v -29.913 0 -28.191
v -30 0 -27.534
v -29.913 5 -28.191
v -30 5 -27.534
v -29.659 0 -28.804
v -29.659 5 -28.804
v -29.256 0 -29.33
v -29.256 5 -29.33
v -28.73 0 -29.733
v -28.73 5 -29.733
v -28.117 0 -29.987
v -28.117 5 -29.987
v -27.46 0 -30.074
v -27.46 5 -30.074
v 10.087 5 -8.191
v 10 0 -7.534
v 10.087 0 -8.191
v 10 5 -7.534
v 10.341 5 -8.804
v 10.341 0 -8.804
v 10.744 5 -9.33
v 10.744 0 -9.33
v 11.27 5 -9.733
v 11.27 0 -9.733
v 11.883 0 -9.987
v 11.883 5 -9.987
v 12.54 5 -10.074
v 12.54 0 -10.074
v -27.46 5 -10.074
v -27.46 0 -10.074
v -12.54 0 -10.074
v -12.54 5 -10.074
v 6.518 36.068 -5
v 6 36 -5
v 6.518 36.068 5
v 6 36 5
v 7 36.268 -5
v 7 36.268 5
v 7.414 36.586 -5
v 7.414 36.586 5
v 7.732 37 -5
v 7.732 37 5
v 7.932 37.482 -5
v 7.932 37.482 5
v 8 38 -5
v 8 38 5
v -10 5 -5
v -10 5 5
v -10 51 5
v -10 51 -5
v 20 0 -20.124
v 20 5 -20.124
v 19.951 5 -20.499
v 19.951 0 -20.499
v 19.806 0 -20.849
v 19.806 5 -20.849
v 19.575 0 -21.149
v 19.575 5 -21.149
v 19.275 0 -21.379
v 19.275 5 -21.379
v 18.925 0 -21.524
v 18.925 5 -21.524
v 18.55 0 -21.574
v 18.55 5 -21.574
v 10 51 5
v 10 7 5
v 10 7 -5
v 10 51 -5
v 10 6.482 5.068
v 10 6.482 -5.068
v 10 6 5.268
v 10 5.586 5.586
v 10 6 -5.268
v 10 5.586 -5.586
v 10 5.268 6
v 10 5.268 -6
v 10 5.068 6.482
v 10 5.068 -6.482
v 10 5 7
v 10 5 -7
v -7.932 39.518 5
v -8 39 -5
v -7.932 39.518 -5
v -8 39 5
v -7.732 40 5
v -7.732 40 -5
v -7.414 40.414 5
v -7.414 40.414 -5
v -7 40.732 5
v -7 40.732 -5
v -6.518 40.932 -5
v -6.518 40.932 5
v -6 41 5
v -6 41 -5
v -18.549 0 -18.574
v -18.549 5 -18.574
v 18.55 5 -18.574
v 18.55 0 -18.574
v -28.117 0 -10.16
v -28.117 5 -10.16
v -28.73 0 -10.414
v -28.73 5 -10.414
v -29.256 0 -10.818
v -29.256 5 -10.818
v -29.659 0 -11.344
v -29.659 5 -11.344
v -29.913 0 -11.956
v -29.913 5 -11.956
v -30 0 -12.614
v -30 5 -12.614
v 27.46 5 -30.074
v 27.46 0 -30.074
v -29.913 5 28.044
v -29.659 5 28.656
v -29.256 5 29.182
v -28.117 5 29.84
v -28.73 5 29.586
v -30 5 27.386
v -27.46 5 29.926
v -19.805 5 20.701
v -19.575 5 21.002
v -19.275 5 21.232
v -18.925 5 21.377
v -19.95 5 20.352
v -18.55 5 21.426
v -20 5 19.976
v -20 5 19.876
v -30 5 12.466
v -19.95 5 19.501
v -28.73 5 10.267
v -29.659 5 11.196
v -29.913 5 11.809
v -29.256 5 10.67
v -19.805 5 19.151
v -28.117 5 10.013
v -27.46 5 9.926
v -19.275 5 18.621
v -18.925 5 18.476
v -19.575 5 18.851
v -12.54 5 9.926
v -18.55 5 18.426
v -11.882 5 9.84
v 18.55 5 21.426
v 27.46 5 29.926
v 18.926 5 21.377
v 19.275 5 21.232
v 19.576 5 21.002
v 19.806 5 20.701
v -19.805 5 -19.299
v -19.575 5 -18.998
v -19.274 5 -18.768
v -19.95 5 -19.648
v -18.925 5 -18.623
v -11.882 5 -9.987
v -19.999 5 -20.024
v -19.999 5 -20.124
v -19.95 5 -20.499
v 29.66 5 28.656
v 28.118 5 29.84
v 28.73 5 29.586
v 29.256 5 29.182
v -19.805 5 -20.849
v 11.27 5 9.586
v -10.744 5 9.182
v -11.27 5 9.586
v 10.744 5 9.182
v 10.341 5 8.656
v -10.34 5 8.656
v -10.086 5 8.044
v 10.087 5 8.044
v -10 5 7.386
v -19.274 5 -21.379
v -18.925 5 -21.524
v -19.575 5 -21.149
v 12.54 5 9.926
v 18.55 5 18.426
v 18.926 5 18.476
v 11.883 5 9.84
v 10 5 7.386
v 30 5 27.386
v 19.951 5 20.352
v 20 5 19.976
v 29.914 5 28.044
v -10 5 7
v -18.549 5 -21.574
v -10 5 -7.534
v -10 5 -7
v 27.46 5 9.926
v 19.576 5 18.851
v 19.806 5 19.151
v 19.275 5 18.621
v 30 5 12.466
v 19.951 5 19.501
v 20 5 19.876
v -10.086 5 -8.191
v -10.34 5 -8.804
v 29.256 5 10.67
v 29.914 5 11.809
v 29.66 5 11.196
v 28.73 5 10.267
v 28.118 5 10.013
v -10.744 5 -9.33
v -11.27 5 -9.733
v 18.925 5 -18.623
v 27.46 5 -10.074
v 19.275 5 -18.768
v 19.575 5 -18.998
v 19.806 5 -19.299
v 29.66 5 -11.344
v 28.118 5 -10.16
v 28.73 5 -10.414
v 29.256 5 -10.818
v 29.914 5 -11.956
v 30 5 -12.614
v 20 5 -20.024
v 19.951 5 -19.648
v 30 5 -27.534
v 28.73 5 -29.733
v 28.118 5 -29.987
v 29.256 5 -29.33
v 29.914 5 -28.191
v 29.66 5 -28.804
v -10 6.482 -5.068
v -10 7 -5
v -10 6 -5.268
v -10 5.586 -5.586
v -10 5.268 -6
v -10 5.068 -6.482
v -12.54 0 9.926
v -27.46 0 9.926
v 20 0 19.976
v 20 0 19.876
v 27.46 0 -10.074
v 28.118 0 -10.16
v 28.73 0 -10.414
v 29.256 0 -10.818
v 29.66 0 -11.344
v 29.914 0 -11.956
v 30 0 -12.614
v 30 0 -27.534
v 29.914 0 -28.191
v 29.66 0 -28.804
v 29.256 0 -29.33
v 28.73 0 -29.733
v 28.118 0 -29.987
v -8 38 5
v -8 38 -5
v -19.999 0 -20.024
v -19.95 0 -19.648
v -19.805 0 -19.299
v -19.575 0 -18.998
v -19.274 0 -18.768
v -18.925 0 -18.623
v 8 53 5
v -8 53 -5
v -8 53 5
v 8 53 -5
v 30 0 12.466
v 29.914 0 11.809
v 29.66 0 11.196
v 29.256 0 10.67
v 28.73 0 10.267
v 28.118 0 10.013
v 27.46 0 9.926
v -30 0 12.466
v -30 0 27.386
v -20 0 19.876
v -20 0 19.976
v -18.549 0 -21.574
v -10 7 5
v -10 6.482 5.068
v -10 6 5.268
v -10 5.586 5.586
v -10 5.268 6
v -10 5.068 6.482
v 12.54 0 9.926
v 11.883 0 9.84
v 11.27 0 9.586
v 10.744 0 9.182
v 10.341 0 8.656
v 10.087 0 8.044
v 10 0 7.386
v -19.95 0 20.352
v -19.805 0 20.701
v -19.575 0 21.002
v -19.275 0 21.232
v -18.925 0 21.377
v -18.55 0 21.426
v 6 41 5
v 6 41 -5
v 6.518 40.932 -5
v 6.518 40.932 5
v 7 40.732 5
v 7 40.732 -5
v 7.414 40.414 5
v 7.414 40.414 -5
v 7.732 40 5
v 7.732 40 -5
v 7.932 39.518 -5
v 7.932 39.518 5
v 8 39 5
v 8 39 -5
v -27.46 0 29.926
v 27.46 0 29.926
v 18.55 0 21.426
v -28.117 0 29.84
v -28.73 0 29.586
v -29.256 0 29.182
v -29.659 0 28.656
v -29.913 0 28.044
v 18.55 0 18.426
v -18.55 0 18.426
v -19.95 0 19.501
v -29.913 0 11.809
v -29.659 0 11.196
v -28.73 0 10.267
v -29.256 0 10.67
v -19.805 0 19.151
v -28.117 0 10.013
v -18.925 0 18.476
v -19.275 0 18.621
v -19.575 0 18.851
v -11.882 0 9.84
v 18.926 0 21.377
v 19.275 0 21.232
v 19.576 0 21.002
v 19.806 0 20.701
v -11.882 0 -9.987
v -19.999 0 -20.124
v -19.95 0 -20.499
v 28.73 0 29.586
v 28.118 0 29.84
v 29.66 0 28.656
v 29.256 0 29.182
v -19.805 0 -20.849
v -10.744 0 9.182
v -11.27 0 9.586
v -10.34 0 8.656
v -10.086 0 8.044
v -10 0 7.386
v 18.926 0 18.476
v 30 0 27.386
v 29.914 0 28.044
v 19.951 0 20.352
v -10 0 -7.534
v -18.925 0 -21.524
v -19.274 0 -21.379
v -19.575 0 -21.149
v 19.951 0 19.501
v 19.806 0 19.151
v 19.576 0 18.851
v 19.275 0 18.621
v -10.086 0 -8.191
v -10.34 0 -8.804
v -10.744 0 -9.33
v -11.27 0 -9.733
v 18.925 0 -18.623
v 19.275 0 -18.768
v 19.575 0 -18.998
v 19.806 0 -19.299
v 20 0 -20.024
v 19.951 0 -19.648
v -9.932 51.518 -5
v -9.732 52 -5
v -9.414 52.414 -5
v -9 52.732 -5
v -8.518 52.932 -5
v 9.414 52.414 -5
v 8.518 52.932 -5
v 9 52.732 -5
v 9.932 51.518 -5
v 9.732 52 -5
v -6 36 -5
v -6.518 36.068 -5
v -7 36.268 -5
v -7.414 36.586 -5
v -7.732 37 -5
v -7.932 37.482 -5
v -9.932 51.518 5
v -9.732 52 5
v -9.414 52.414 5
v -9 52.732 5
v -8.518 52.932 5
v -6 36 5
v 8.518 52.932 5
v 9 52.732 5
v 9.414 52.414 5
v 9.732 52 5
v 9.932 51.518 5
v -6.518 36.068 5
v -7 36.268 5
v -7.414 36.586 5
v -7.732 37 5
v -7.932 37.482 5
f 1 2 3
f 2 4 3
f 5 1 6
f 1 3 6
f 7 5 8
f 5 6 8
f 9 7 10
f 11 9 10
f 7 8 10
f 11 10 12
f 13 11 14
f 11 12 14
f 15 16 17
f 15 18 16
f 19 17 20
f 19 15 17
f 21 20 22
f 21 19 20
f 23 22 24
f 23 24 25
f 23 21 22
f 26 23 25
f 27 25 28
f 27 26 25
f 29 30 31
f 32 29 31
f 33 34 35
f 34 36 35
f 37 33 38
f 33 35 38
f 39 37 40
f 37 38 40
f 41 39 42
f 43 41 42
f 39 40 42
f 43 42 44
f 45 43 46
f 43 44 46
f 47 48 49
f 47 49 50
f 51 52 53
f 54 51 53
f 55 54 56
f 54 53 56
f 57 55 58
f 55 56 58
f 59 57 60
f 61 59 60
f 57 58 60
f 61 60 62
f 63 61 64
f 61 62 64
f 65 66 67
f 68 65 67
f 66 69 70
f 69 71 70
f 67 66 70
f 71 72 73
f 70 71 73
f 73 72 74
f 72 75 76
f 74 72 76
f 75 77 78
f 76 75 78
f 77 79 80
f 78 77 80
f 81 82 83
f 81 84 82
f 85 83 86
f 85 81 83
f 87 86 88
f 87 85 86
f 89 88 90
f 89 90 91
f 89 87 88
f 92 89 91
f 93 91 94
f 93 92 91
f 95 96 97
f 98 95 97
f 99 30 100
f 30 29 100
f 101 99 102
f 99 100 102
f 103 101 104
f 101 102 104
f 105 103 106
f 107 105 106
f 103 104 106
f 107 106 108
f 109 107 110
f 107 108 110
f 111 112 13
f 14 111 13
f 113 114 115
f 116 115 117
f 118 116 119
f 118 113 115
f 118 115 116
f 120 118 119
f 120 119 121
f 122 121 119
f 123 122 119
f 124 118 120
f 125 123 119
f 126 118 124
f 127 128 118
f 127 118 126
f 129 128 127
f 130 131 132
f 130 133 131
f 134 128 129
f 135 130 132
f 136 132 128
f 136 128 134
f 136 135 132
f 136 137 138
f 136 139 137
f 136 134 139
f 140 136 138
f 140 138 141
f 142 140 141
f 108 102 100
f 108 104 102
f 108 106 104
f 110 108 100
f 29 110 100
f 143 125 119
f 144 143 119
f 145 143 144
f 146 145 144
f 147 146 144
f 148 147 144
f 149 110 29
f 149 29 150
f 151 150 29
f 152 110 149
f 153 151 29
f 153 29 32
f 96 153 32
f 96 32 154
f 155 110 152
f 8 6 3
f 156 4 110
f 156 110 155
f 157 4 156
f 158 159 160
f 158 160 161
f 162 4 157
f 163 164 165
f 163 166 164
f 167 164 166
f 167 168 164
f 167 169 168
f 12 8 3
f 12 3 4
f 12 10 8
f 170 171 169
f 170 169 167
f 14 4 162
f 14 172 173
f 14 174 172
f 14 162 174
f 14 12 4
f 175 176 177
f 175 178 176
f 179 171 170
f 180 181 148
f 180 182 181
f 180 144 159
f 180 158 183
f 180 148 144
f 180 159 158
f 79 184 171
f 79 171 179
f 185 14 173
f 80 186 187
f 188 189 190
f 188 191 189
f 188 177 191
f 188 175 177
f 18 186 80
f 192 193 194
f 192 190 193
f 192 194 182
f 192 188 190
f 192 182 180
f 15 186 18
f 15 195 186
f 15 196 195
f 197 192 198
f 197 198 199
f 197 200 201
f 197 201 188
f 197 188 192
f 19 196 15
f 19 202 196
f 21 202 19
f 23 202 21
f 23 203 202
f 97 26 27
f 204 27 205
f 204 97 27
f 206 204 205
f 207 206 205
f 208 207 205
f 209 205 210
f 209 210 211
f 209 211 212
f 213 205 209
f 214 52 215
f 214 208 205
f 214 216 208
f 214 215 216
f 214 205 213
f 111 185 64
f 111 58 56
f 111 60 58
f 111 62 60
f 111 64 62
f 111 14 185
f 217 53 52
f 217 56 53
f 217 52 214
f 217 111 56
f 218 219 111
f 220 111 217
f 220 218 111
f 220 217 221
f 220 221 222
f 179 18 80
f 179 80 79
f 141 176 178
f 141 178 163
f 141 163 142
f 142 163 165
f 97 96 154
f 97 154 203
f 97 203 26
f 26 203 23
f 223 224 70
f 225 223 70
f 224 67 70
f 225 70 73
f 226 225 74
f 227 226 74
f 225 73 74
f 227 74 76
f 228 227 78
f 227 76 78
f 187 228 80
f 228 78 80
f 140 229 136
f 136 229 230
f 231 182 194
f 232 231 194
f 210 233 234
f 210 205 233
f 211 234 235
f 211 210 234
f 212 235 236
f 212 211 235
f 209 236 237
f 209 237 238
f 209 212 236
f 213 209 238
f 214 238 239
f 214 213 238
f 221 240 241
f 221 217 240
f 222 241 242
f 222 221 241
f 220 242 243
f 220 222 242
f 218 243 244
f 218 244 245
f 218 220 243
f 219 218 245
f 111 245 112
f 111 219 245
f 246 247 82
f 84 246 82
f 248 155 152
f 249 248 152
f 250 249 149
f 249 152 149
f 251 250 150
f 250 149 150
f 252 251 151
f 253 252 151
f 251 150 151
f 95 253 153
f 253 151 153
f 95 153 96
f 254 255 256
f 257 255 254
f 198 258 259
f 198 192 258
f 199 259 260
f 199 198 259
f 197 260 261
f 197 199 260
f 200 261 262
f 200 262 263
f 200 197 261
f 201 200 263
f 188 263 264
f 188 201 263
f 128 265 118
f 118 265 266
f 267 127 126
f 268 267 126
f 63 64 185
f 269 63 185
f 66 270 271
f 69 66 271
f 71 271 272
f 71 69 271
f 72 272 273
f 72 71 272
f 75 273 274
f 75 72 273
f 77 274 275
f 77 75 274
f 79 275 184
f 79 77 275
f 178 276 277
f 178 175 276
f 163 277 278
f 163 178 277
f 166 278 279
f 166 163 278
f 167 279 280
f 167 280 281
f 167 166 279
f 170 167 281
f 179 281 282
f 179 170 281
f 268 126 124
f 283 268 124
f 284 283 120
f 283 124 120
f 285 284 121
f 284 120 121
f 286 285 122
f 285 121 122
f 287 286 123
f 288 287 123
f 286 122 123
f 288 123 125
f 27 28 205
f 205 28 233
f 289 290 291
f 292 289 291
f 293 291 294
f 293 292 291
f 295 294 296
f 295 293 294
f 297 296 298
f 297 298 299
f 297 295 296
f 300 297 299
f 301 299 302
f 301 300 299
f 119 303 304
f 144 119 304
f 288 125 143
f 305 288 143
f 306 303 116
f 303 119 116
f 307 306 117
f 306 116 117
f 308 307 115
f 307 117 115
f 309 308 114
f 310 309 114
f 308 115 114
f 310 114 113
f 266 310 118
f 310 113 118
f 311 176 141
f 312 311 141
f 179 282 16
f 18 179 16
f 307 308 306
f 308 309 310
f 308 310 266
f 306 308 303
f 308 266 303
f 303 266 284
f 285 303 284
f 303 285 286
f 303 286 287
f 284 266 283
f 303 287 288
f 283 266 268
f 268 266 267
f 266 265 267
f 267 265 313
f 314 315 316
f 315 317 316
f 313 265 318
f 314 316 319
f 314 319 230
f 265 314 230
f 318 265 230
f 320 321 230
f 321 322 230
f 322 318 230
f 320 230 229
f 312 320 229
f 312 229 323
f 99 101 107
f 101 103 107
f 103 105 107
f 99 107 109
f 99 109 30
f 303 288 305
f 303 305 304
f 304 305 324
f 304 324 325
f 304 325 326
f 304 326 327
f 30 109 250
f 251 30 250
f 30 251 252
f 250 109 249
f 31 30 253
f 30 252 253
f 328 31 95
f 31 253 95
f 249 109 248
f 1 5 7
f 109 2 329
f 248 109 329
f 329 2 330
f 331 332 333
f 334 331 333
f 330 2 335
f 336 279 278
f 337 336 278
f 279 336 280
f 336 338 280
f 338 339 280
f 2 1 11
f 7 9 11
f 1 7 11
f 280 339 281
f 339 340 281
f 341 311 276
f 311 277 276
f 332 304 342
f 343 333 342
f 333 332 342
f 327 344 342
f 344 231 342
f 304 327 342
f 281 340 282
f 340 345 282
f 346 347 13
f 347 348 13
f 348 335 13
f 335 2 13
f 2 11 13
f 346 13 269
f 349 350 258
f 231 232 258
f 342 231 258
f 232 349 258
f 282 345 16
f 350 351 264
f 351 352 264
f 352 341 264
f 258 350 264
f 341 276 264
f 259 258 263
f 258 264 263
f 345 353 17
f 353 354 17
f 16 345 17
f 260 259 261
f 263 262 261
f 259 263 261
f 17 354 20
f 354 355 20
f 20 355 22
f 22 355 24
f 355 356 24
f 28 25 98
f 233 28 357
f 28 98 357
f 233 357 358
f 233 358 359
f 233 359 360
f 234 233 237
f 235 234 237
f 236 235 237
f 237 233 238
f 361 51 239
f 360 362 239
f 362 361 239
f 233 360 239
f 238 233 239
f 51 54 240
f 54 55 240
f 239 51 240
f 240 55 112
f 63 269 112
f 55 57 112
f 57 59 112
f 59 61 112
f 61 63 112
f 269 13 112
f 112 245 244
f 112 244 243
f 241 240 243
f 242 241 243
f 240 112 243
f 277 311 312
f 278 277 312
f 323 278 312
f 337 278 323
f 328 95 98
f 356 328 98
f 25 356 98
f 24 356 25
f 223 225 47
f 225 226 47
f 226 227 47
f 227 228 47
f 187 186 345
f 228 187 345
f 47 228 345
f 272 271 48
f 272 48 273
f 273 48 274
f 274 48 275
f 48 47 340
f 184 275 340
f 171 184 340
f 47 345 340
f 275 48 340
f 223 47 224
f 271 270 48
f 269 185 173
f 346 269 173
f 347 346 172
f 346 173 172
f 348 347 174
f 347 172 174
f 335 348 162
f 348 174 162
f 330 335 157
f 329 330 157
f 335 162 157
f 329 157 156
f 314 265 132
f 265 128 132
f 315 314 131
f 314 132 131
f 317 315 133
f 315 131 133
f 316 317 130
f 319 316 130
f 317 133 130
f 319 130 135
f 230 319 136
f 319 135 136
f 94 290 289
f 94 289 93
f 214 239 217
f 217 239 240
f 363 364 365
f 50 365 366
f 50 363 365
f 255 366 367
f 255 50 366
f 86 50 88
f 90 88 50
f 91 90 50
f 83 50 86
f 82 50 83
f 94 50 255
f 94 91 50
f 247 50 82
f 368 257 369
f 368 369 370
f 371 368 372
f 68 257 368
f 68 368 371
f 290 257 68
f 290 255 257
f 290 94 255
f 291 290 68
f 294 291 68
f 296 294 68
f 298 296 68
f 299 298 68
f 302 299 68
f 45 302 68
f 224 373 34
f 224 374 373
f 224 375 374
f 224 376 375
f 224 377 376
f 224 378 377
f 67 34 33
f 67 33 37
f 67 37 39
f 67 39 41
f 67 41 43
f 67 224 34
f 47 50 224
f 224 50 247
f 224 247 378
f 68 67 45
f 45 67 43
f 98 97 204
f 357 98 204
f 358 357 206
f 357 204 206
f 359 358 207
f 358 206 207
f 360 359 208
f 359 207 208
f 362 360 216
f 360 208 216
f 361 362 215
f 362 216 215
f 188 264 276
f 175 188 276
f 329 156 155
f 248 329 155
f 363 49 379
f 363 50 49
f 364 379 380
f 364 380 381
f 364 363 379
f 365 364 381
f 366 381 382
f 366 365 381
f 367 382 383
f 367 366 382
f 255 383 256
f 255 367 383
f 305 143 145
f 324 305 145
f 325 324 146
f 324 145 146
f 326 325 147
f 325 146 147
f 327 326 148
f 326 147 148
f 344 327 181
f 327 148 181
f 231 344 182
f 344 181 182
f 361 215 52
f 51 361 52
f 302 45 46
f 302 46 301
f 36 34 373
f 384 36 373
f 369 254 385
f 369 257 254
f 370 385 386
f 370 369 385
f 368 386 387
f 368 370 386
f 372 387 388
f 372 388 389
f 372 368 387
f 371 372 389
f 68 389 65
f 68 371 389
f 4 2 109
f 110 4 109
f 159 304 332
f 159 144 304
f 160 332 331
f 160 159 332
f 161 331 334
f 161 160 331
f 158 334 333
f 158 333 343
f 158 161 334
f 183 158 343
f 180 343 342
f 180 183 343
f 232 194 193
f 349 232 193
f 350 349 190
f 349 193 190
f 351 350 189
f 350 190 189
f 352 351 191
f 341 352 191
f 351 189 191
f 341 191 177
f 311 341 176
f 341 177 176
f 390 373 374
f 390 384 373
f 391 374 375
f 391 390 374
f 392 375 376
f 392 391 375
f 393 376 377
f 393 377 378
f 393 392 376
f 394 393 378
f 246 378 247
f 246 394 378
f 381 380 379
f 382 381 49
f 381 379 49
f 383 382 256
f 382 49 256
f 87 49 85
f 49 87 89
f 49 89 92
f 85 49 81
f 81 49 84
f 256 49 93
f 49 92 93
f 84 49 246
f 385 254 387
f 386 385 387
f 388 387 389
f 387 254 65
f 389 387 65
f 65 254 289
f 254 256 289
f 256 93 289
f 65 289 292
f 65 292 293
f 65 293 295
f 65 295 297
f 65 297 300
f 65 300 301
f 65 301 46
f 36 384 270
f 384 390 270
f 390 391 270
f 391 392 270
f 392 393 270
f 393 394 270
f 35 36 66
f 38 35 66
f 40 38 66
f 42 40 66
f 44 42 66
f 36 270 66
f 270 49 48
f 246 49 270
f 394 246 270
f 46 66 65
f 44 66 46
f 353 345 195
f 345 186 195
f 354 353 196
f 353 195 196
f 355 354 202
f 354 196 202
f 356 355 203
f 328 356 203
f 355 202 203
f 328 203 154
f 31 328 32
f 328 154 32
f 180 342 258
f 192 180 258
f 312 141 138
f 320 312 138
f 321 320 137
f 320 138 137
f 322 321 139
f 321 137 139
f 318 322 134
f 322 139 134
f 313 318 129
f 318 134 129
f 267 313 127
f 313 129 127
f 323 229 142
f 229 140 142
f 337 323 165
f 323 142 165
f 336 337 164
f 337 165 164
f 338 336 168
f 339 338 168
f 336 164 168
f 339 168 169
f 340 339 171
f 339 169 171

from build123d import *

# Parameters (mm, degrees)
BOSS_EXTRUDE1_DEPTH = 5
CUT_EXTRUDE1_DEPTH  = 43.772012023
FILLET1_R           = 2.54
SKETCH3_W           = 20
SKETCH3_H           = 10
BOSS_EXTRUDE2_DEPTH = 48
SKETCH4_W           = 16
SKETCH4_H           = 5
CUT_EXTRUDE4_DEPTH  = 32
FILLET2_R           = 2


with BuildPart() as part:
    # Sketch1 → Boss-Extrude1 (new body)
    with BuildSketch(Plane(origin=(0, 0, 0), x_dir=(1, 0, 0), z_dir=(0, 1, 0))):
        Polygon((-29.999623956, -29.926382831), (30.000376044, -29.926382831), (30.000376044, -9.926382831), (10.000376044, -9.926382831), (10.000376044, 10.073617169), (30.000376044, 10.073617169), (30.000376044, 30.073617169), (-29.999623956, 30.073617169), (-29.999623956, 10.073617169), (-9.999623956, 10.073617169), (-9.999623956, -9.926382831), (-29.999623956, -9.926382831), align=None)
    extrude(amount=BOSS_EXTRUDE1_DEPTH)

    # Sketch2 → Cut-Extrude1 (cut, through all)
    with BuildSketch(Plane(origin=(0, 5, 0), x_dir=(1, 0, 0), z_dir=(0, 1, 0))):
        with BuildLine():
            Line((-18.549247911, 18.573617169), (18.55, 18.573617169))
            ThreePointArc((18.55, 18.573617169), (19.575304833, 18.998312337), (20, 20.023617169))
            Line((20, 20.023617169), (20, 20.123617169))
            ThreePointArc((20, 20.123617169), (19.575304833, 21.148922002), (18.55, 21.573617169))
            Line((18.55, 21.573617169), (-18.549247911, 21.573617169))
            ThreePointArc((-18.549247911, 21.573617169), (-19.574552744, 21.148922002), (-19.999247911, 20.123617169))
            Line((-19.999247911, 20.123617169), (-19.999247911, 20.023617169))
            ThreePointArc((-19.999247911, 20.023617169), (-19.574552744, 18.998312337), (-18.549247911, 18.573617169))
        make_face()
        with BuildLine():
            Line((-18.549623956, -21.426382831), (18.550376044, -21.426382831))
            ThreePointArc((18.550376044, -21.426382831), (19.575680877, -21.001687663), (20.000376044, -19.976382831))
            Line((20.000376044, -19.976382831), (20.000376044, -19.876382831))
            ThreePointArc((20.000376044, -19.876382831), (19.575680877, -18.851077998), (18.550376044, -18.426382831))
            Line((18.550376044, -18.426382831), (-18.549623956, -18.426382831))
            ThreePointArc((-18.549623956, -18.426382831), (-19.574928788, -18.851077998), (-19.999623956, -19.876382831))
            Line((-19.999623956, -19.876382831), (-19.999623956, -19.976382831))
            ThreePointArc((-19.999623956, -19.976382831), (-19.574928788, -21.001687663), (-18.549623956, -21.426382831))
        make_face()
    extrude(amount=-CUT_EXTRUDE1_DEPTH, mode=Mode.SUBTRACT)

    # Fillet1
    fillet1_edges = [part.edges().sort_by_distance(p)[0] for p in [
        (-29.999623956, 2.5, -10.073617169),
        (-29.999623956, 2.5, -30.073617169),
        (30.000376044, 2.5, -30.073617169),
        (30.000376044, 2.5, -10.073617169),
        (10.000376044, 2.5, -10.073617169),
        (10.000376044, 2.5, 9.926382831),
        (30.000376044, 2.5, 9.926382831),
        (30.000376044, 2.5, 29.926382831),
        (-29.999623956, 2.5, 29.926382831),
        (-29.999623956, 2.5, 9.926382831),
        (-9.999623956, 2.5, 9.926382831),
        (-9.999623956, 2.5, -10.073617169),
    ]]
    fillet(fillet1_edges, radius=FILLET1_R)

    # Sketch3 → Boss-Extrude2 (add)
    with BuildSketch(Plane(origin=(0, 5, 0), x_dir=(1, 0, 0), z_dir=(0, 1, 0))):
        Rectangle(SKETCH3_W, SKETCH3_H)
    extrude(amount=BOSS_EXTRUDE2_DEPTH)

    # Sketch4 → Cut-Extrude4 (cut)
    with BuildSketch(Plane(origin=(0, 0, -5), x_dir=(-1, 0, 0), z_dir=(0, 0, -1))):
        with Locations((0, 38.5)):
            Rectangle(SKETCH4_W, SKETCH4_H)
    extrude(amount=-CUT_EXTRUDE4_DEPTH, mode=Mode.SUBTRACT)

    # Fillet2
    fillet2_edges = [part.edges().sort_by_distance(p)[0] for p in [
        (0.000188022, 5, 5),
        (0.000188022, 5, -5),
        (10, 53, 0),
        (-10, 53, 0),
        (-8, 41, 0),
        (-8, 36, 0),
        (8, 36, 0),
        (8, 41, 0),
    ]]
    fillet(fillet2_edges, radius=FILLET2_R)


solid = part.part
